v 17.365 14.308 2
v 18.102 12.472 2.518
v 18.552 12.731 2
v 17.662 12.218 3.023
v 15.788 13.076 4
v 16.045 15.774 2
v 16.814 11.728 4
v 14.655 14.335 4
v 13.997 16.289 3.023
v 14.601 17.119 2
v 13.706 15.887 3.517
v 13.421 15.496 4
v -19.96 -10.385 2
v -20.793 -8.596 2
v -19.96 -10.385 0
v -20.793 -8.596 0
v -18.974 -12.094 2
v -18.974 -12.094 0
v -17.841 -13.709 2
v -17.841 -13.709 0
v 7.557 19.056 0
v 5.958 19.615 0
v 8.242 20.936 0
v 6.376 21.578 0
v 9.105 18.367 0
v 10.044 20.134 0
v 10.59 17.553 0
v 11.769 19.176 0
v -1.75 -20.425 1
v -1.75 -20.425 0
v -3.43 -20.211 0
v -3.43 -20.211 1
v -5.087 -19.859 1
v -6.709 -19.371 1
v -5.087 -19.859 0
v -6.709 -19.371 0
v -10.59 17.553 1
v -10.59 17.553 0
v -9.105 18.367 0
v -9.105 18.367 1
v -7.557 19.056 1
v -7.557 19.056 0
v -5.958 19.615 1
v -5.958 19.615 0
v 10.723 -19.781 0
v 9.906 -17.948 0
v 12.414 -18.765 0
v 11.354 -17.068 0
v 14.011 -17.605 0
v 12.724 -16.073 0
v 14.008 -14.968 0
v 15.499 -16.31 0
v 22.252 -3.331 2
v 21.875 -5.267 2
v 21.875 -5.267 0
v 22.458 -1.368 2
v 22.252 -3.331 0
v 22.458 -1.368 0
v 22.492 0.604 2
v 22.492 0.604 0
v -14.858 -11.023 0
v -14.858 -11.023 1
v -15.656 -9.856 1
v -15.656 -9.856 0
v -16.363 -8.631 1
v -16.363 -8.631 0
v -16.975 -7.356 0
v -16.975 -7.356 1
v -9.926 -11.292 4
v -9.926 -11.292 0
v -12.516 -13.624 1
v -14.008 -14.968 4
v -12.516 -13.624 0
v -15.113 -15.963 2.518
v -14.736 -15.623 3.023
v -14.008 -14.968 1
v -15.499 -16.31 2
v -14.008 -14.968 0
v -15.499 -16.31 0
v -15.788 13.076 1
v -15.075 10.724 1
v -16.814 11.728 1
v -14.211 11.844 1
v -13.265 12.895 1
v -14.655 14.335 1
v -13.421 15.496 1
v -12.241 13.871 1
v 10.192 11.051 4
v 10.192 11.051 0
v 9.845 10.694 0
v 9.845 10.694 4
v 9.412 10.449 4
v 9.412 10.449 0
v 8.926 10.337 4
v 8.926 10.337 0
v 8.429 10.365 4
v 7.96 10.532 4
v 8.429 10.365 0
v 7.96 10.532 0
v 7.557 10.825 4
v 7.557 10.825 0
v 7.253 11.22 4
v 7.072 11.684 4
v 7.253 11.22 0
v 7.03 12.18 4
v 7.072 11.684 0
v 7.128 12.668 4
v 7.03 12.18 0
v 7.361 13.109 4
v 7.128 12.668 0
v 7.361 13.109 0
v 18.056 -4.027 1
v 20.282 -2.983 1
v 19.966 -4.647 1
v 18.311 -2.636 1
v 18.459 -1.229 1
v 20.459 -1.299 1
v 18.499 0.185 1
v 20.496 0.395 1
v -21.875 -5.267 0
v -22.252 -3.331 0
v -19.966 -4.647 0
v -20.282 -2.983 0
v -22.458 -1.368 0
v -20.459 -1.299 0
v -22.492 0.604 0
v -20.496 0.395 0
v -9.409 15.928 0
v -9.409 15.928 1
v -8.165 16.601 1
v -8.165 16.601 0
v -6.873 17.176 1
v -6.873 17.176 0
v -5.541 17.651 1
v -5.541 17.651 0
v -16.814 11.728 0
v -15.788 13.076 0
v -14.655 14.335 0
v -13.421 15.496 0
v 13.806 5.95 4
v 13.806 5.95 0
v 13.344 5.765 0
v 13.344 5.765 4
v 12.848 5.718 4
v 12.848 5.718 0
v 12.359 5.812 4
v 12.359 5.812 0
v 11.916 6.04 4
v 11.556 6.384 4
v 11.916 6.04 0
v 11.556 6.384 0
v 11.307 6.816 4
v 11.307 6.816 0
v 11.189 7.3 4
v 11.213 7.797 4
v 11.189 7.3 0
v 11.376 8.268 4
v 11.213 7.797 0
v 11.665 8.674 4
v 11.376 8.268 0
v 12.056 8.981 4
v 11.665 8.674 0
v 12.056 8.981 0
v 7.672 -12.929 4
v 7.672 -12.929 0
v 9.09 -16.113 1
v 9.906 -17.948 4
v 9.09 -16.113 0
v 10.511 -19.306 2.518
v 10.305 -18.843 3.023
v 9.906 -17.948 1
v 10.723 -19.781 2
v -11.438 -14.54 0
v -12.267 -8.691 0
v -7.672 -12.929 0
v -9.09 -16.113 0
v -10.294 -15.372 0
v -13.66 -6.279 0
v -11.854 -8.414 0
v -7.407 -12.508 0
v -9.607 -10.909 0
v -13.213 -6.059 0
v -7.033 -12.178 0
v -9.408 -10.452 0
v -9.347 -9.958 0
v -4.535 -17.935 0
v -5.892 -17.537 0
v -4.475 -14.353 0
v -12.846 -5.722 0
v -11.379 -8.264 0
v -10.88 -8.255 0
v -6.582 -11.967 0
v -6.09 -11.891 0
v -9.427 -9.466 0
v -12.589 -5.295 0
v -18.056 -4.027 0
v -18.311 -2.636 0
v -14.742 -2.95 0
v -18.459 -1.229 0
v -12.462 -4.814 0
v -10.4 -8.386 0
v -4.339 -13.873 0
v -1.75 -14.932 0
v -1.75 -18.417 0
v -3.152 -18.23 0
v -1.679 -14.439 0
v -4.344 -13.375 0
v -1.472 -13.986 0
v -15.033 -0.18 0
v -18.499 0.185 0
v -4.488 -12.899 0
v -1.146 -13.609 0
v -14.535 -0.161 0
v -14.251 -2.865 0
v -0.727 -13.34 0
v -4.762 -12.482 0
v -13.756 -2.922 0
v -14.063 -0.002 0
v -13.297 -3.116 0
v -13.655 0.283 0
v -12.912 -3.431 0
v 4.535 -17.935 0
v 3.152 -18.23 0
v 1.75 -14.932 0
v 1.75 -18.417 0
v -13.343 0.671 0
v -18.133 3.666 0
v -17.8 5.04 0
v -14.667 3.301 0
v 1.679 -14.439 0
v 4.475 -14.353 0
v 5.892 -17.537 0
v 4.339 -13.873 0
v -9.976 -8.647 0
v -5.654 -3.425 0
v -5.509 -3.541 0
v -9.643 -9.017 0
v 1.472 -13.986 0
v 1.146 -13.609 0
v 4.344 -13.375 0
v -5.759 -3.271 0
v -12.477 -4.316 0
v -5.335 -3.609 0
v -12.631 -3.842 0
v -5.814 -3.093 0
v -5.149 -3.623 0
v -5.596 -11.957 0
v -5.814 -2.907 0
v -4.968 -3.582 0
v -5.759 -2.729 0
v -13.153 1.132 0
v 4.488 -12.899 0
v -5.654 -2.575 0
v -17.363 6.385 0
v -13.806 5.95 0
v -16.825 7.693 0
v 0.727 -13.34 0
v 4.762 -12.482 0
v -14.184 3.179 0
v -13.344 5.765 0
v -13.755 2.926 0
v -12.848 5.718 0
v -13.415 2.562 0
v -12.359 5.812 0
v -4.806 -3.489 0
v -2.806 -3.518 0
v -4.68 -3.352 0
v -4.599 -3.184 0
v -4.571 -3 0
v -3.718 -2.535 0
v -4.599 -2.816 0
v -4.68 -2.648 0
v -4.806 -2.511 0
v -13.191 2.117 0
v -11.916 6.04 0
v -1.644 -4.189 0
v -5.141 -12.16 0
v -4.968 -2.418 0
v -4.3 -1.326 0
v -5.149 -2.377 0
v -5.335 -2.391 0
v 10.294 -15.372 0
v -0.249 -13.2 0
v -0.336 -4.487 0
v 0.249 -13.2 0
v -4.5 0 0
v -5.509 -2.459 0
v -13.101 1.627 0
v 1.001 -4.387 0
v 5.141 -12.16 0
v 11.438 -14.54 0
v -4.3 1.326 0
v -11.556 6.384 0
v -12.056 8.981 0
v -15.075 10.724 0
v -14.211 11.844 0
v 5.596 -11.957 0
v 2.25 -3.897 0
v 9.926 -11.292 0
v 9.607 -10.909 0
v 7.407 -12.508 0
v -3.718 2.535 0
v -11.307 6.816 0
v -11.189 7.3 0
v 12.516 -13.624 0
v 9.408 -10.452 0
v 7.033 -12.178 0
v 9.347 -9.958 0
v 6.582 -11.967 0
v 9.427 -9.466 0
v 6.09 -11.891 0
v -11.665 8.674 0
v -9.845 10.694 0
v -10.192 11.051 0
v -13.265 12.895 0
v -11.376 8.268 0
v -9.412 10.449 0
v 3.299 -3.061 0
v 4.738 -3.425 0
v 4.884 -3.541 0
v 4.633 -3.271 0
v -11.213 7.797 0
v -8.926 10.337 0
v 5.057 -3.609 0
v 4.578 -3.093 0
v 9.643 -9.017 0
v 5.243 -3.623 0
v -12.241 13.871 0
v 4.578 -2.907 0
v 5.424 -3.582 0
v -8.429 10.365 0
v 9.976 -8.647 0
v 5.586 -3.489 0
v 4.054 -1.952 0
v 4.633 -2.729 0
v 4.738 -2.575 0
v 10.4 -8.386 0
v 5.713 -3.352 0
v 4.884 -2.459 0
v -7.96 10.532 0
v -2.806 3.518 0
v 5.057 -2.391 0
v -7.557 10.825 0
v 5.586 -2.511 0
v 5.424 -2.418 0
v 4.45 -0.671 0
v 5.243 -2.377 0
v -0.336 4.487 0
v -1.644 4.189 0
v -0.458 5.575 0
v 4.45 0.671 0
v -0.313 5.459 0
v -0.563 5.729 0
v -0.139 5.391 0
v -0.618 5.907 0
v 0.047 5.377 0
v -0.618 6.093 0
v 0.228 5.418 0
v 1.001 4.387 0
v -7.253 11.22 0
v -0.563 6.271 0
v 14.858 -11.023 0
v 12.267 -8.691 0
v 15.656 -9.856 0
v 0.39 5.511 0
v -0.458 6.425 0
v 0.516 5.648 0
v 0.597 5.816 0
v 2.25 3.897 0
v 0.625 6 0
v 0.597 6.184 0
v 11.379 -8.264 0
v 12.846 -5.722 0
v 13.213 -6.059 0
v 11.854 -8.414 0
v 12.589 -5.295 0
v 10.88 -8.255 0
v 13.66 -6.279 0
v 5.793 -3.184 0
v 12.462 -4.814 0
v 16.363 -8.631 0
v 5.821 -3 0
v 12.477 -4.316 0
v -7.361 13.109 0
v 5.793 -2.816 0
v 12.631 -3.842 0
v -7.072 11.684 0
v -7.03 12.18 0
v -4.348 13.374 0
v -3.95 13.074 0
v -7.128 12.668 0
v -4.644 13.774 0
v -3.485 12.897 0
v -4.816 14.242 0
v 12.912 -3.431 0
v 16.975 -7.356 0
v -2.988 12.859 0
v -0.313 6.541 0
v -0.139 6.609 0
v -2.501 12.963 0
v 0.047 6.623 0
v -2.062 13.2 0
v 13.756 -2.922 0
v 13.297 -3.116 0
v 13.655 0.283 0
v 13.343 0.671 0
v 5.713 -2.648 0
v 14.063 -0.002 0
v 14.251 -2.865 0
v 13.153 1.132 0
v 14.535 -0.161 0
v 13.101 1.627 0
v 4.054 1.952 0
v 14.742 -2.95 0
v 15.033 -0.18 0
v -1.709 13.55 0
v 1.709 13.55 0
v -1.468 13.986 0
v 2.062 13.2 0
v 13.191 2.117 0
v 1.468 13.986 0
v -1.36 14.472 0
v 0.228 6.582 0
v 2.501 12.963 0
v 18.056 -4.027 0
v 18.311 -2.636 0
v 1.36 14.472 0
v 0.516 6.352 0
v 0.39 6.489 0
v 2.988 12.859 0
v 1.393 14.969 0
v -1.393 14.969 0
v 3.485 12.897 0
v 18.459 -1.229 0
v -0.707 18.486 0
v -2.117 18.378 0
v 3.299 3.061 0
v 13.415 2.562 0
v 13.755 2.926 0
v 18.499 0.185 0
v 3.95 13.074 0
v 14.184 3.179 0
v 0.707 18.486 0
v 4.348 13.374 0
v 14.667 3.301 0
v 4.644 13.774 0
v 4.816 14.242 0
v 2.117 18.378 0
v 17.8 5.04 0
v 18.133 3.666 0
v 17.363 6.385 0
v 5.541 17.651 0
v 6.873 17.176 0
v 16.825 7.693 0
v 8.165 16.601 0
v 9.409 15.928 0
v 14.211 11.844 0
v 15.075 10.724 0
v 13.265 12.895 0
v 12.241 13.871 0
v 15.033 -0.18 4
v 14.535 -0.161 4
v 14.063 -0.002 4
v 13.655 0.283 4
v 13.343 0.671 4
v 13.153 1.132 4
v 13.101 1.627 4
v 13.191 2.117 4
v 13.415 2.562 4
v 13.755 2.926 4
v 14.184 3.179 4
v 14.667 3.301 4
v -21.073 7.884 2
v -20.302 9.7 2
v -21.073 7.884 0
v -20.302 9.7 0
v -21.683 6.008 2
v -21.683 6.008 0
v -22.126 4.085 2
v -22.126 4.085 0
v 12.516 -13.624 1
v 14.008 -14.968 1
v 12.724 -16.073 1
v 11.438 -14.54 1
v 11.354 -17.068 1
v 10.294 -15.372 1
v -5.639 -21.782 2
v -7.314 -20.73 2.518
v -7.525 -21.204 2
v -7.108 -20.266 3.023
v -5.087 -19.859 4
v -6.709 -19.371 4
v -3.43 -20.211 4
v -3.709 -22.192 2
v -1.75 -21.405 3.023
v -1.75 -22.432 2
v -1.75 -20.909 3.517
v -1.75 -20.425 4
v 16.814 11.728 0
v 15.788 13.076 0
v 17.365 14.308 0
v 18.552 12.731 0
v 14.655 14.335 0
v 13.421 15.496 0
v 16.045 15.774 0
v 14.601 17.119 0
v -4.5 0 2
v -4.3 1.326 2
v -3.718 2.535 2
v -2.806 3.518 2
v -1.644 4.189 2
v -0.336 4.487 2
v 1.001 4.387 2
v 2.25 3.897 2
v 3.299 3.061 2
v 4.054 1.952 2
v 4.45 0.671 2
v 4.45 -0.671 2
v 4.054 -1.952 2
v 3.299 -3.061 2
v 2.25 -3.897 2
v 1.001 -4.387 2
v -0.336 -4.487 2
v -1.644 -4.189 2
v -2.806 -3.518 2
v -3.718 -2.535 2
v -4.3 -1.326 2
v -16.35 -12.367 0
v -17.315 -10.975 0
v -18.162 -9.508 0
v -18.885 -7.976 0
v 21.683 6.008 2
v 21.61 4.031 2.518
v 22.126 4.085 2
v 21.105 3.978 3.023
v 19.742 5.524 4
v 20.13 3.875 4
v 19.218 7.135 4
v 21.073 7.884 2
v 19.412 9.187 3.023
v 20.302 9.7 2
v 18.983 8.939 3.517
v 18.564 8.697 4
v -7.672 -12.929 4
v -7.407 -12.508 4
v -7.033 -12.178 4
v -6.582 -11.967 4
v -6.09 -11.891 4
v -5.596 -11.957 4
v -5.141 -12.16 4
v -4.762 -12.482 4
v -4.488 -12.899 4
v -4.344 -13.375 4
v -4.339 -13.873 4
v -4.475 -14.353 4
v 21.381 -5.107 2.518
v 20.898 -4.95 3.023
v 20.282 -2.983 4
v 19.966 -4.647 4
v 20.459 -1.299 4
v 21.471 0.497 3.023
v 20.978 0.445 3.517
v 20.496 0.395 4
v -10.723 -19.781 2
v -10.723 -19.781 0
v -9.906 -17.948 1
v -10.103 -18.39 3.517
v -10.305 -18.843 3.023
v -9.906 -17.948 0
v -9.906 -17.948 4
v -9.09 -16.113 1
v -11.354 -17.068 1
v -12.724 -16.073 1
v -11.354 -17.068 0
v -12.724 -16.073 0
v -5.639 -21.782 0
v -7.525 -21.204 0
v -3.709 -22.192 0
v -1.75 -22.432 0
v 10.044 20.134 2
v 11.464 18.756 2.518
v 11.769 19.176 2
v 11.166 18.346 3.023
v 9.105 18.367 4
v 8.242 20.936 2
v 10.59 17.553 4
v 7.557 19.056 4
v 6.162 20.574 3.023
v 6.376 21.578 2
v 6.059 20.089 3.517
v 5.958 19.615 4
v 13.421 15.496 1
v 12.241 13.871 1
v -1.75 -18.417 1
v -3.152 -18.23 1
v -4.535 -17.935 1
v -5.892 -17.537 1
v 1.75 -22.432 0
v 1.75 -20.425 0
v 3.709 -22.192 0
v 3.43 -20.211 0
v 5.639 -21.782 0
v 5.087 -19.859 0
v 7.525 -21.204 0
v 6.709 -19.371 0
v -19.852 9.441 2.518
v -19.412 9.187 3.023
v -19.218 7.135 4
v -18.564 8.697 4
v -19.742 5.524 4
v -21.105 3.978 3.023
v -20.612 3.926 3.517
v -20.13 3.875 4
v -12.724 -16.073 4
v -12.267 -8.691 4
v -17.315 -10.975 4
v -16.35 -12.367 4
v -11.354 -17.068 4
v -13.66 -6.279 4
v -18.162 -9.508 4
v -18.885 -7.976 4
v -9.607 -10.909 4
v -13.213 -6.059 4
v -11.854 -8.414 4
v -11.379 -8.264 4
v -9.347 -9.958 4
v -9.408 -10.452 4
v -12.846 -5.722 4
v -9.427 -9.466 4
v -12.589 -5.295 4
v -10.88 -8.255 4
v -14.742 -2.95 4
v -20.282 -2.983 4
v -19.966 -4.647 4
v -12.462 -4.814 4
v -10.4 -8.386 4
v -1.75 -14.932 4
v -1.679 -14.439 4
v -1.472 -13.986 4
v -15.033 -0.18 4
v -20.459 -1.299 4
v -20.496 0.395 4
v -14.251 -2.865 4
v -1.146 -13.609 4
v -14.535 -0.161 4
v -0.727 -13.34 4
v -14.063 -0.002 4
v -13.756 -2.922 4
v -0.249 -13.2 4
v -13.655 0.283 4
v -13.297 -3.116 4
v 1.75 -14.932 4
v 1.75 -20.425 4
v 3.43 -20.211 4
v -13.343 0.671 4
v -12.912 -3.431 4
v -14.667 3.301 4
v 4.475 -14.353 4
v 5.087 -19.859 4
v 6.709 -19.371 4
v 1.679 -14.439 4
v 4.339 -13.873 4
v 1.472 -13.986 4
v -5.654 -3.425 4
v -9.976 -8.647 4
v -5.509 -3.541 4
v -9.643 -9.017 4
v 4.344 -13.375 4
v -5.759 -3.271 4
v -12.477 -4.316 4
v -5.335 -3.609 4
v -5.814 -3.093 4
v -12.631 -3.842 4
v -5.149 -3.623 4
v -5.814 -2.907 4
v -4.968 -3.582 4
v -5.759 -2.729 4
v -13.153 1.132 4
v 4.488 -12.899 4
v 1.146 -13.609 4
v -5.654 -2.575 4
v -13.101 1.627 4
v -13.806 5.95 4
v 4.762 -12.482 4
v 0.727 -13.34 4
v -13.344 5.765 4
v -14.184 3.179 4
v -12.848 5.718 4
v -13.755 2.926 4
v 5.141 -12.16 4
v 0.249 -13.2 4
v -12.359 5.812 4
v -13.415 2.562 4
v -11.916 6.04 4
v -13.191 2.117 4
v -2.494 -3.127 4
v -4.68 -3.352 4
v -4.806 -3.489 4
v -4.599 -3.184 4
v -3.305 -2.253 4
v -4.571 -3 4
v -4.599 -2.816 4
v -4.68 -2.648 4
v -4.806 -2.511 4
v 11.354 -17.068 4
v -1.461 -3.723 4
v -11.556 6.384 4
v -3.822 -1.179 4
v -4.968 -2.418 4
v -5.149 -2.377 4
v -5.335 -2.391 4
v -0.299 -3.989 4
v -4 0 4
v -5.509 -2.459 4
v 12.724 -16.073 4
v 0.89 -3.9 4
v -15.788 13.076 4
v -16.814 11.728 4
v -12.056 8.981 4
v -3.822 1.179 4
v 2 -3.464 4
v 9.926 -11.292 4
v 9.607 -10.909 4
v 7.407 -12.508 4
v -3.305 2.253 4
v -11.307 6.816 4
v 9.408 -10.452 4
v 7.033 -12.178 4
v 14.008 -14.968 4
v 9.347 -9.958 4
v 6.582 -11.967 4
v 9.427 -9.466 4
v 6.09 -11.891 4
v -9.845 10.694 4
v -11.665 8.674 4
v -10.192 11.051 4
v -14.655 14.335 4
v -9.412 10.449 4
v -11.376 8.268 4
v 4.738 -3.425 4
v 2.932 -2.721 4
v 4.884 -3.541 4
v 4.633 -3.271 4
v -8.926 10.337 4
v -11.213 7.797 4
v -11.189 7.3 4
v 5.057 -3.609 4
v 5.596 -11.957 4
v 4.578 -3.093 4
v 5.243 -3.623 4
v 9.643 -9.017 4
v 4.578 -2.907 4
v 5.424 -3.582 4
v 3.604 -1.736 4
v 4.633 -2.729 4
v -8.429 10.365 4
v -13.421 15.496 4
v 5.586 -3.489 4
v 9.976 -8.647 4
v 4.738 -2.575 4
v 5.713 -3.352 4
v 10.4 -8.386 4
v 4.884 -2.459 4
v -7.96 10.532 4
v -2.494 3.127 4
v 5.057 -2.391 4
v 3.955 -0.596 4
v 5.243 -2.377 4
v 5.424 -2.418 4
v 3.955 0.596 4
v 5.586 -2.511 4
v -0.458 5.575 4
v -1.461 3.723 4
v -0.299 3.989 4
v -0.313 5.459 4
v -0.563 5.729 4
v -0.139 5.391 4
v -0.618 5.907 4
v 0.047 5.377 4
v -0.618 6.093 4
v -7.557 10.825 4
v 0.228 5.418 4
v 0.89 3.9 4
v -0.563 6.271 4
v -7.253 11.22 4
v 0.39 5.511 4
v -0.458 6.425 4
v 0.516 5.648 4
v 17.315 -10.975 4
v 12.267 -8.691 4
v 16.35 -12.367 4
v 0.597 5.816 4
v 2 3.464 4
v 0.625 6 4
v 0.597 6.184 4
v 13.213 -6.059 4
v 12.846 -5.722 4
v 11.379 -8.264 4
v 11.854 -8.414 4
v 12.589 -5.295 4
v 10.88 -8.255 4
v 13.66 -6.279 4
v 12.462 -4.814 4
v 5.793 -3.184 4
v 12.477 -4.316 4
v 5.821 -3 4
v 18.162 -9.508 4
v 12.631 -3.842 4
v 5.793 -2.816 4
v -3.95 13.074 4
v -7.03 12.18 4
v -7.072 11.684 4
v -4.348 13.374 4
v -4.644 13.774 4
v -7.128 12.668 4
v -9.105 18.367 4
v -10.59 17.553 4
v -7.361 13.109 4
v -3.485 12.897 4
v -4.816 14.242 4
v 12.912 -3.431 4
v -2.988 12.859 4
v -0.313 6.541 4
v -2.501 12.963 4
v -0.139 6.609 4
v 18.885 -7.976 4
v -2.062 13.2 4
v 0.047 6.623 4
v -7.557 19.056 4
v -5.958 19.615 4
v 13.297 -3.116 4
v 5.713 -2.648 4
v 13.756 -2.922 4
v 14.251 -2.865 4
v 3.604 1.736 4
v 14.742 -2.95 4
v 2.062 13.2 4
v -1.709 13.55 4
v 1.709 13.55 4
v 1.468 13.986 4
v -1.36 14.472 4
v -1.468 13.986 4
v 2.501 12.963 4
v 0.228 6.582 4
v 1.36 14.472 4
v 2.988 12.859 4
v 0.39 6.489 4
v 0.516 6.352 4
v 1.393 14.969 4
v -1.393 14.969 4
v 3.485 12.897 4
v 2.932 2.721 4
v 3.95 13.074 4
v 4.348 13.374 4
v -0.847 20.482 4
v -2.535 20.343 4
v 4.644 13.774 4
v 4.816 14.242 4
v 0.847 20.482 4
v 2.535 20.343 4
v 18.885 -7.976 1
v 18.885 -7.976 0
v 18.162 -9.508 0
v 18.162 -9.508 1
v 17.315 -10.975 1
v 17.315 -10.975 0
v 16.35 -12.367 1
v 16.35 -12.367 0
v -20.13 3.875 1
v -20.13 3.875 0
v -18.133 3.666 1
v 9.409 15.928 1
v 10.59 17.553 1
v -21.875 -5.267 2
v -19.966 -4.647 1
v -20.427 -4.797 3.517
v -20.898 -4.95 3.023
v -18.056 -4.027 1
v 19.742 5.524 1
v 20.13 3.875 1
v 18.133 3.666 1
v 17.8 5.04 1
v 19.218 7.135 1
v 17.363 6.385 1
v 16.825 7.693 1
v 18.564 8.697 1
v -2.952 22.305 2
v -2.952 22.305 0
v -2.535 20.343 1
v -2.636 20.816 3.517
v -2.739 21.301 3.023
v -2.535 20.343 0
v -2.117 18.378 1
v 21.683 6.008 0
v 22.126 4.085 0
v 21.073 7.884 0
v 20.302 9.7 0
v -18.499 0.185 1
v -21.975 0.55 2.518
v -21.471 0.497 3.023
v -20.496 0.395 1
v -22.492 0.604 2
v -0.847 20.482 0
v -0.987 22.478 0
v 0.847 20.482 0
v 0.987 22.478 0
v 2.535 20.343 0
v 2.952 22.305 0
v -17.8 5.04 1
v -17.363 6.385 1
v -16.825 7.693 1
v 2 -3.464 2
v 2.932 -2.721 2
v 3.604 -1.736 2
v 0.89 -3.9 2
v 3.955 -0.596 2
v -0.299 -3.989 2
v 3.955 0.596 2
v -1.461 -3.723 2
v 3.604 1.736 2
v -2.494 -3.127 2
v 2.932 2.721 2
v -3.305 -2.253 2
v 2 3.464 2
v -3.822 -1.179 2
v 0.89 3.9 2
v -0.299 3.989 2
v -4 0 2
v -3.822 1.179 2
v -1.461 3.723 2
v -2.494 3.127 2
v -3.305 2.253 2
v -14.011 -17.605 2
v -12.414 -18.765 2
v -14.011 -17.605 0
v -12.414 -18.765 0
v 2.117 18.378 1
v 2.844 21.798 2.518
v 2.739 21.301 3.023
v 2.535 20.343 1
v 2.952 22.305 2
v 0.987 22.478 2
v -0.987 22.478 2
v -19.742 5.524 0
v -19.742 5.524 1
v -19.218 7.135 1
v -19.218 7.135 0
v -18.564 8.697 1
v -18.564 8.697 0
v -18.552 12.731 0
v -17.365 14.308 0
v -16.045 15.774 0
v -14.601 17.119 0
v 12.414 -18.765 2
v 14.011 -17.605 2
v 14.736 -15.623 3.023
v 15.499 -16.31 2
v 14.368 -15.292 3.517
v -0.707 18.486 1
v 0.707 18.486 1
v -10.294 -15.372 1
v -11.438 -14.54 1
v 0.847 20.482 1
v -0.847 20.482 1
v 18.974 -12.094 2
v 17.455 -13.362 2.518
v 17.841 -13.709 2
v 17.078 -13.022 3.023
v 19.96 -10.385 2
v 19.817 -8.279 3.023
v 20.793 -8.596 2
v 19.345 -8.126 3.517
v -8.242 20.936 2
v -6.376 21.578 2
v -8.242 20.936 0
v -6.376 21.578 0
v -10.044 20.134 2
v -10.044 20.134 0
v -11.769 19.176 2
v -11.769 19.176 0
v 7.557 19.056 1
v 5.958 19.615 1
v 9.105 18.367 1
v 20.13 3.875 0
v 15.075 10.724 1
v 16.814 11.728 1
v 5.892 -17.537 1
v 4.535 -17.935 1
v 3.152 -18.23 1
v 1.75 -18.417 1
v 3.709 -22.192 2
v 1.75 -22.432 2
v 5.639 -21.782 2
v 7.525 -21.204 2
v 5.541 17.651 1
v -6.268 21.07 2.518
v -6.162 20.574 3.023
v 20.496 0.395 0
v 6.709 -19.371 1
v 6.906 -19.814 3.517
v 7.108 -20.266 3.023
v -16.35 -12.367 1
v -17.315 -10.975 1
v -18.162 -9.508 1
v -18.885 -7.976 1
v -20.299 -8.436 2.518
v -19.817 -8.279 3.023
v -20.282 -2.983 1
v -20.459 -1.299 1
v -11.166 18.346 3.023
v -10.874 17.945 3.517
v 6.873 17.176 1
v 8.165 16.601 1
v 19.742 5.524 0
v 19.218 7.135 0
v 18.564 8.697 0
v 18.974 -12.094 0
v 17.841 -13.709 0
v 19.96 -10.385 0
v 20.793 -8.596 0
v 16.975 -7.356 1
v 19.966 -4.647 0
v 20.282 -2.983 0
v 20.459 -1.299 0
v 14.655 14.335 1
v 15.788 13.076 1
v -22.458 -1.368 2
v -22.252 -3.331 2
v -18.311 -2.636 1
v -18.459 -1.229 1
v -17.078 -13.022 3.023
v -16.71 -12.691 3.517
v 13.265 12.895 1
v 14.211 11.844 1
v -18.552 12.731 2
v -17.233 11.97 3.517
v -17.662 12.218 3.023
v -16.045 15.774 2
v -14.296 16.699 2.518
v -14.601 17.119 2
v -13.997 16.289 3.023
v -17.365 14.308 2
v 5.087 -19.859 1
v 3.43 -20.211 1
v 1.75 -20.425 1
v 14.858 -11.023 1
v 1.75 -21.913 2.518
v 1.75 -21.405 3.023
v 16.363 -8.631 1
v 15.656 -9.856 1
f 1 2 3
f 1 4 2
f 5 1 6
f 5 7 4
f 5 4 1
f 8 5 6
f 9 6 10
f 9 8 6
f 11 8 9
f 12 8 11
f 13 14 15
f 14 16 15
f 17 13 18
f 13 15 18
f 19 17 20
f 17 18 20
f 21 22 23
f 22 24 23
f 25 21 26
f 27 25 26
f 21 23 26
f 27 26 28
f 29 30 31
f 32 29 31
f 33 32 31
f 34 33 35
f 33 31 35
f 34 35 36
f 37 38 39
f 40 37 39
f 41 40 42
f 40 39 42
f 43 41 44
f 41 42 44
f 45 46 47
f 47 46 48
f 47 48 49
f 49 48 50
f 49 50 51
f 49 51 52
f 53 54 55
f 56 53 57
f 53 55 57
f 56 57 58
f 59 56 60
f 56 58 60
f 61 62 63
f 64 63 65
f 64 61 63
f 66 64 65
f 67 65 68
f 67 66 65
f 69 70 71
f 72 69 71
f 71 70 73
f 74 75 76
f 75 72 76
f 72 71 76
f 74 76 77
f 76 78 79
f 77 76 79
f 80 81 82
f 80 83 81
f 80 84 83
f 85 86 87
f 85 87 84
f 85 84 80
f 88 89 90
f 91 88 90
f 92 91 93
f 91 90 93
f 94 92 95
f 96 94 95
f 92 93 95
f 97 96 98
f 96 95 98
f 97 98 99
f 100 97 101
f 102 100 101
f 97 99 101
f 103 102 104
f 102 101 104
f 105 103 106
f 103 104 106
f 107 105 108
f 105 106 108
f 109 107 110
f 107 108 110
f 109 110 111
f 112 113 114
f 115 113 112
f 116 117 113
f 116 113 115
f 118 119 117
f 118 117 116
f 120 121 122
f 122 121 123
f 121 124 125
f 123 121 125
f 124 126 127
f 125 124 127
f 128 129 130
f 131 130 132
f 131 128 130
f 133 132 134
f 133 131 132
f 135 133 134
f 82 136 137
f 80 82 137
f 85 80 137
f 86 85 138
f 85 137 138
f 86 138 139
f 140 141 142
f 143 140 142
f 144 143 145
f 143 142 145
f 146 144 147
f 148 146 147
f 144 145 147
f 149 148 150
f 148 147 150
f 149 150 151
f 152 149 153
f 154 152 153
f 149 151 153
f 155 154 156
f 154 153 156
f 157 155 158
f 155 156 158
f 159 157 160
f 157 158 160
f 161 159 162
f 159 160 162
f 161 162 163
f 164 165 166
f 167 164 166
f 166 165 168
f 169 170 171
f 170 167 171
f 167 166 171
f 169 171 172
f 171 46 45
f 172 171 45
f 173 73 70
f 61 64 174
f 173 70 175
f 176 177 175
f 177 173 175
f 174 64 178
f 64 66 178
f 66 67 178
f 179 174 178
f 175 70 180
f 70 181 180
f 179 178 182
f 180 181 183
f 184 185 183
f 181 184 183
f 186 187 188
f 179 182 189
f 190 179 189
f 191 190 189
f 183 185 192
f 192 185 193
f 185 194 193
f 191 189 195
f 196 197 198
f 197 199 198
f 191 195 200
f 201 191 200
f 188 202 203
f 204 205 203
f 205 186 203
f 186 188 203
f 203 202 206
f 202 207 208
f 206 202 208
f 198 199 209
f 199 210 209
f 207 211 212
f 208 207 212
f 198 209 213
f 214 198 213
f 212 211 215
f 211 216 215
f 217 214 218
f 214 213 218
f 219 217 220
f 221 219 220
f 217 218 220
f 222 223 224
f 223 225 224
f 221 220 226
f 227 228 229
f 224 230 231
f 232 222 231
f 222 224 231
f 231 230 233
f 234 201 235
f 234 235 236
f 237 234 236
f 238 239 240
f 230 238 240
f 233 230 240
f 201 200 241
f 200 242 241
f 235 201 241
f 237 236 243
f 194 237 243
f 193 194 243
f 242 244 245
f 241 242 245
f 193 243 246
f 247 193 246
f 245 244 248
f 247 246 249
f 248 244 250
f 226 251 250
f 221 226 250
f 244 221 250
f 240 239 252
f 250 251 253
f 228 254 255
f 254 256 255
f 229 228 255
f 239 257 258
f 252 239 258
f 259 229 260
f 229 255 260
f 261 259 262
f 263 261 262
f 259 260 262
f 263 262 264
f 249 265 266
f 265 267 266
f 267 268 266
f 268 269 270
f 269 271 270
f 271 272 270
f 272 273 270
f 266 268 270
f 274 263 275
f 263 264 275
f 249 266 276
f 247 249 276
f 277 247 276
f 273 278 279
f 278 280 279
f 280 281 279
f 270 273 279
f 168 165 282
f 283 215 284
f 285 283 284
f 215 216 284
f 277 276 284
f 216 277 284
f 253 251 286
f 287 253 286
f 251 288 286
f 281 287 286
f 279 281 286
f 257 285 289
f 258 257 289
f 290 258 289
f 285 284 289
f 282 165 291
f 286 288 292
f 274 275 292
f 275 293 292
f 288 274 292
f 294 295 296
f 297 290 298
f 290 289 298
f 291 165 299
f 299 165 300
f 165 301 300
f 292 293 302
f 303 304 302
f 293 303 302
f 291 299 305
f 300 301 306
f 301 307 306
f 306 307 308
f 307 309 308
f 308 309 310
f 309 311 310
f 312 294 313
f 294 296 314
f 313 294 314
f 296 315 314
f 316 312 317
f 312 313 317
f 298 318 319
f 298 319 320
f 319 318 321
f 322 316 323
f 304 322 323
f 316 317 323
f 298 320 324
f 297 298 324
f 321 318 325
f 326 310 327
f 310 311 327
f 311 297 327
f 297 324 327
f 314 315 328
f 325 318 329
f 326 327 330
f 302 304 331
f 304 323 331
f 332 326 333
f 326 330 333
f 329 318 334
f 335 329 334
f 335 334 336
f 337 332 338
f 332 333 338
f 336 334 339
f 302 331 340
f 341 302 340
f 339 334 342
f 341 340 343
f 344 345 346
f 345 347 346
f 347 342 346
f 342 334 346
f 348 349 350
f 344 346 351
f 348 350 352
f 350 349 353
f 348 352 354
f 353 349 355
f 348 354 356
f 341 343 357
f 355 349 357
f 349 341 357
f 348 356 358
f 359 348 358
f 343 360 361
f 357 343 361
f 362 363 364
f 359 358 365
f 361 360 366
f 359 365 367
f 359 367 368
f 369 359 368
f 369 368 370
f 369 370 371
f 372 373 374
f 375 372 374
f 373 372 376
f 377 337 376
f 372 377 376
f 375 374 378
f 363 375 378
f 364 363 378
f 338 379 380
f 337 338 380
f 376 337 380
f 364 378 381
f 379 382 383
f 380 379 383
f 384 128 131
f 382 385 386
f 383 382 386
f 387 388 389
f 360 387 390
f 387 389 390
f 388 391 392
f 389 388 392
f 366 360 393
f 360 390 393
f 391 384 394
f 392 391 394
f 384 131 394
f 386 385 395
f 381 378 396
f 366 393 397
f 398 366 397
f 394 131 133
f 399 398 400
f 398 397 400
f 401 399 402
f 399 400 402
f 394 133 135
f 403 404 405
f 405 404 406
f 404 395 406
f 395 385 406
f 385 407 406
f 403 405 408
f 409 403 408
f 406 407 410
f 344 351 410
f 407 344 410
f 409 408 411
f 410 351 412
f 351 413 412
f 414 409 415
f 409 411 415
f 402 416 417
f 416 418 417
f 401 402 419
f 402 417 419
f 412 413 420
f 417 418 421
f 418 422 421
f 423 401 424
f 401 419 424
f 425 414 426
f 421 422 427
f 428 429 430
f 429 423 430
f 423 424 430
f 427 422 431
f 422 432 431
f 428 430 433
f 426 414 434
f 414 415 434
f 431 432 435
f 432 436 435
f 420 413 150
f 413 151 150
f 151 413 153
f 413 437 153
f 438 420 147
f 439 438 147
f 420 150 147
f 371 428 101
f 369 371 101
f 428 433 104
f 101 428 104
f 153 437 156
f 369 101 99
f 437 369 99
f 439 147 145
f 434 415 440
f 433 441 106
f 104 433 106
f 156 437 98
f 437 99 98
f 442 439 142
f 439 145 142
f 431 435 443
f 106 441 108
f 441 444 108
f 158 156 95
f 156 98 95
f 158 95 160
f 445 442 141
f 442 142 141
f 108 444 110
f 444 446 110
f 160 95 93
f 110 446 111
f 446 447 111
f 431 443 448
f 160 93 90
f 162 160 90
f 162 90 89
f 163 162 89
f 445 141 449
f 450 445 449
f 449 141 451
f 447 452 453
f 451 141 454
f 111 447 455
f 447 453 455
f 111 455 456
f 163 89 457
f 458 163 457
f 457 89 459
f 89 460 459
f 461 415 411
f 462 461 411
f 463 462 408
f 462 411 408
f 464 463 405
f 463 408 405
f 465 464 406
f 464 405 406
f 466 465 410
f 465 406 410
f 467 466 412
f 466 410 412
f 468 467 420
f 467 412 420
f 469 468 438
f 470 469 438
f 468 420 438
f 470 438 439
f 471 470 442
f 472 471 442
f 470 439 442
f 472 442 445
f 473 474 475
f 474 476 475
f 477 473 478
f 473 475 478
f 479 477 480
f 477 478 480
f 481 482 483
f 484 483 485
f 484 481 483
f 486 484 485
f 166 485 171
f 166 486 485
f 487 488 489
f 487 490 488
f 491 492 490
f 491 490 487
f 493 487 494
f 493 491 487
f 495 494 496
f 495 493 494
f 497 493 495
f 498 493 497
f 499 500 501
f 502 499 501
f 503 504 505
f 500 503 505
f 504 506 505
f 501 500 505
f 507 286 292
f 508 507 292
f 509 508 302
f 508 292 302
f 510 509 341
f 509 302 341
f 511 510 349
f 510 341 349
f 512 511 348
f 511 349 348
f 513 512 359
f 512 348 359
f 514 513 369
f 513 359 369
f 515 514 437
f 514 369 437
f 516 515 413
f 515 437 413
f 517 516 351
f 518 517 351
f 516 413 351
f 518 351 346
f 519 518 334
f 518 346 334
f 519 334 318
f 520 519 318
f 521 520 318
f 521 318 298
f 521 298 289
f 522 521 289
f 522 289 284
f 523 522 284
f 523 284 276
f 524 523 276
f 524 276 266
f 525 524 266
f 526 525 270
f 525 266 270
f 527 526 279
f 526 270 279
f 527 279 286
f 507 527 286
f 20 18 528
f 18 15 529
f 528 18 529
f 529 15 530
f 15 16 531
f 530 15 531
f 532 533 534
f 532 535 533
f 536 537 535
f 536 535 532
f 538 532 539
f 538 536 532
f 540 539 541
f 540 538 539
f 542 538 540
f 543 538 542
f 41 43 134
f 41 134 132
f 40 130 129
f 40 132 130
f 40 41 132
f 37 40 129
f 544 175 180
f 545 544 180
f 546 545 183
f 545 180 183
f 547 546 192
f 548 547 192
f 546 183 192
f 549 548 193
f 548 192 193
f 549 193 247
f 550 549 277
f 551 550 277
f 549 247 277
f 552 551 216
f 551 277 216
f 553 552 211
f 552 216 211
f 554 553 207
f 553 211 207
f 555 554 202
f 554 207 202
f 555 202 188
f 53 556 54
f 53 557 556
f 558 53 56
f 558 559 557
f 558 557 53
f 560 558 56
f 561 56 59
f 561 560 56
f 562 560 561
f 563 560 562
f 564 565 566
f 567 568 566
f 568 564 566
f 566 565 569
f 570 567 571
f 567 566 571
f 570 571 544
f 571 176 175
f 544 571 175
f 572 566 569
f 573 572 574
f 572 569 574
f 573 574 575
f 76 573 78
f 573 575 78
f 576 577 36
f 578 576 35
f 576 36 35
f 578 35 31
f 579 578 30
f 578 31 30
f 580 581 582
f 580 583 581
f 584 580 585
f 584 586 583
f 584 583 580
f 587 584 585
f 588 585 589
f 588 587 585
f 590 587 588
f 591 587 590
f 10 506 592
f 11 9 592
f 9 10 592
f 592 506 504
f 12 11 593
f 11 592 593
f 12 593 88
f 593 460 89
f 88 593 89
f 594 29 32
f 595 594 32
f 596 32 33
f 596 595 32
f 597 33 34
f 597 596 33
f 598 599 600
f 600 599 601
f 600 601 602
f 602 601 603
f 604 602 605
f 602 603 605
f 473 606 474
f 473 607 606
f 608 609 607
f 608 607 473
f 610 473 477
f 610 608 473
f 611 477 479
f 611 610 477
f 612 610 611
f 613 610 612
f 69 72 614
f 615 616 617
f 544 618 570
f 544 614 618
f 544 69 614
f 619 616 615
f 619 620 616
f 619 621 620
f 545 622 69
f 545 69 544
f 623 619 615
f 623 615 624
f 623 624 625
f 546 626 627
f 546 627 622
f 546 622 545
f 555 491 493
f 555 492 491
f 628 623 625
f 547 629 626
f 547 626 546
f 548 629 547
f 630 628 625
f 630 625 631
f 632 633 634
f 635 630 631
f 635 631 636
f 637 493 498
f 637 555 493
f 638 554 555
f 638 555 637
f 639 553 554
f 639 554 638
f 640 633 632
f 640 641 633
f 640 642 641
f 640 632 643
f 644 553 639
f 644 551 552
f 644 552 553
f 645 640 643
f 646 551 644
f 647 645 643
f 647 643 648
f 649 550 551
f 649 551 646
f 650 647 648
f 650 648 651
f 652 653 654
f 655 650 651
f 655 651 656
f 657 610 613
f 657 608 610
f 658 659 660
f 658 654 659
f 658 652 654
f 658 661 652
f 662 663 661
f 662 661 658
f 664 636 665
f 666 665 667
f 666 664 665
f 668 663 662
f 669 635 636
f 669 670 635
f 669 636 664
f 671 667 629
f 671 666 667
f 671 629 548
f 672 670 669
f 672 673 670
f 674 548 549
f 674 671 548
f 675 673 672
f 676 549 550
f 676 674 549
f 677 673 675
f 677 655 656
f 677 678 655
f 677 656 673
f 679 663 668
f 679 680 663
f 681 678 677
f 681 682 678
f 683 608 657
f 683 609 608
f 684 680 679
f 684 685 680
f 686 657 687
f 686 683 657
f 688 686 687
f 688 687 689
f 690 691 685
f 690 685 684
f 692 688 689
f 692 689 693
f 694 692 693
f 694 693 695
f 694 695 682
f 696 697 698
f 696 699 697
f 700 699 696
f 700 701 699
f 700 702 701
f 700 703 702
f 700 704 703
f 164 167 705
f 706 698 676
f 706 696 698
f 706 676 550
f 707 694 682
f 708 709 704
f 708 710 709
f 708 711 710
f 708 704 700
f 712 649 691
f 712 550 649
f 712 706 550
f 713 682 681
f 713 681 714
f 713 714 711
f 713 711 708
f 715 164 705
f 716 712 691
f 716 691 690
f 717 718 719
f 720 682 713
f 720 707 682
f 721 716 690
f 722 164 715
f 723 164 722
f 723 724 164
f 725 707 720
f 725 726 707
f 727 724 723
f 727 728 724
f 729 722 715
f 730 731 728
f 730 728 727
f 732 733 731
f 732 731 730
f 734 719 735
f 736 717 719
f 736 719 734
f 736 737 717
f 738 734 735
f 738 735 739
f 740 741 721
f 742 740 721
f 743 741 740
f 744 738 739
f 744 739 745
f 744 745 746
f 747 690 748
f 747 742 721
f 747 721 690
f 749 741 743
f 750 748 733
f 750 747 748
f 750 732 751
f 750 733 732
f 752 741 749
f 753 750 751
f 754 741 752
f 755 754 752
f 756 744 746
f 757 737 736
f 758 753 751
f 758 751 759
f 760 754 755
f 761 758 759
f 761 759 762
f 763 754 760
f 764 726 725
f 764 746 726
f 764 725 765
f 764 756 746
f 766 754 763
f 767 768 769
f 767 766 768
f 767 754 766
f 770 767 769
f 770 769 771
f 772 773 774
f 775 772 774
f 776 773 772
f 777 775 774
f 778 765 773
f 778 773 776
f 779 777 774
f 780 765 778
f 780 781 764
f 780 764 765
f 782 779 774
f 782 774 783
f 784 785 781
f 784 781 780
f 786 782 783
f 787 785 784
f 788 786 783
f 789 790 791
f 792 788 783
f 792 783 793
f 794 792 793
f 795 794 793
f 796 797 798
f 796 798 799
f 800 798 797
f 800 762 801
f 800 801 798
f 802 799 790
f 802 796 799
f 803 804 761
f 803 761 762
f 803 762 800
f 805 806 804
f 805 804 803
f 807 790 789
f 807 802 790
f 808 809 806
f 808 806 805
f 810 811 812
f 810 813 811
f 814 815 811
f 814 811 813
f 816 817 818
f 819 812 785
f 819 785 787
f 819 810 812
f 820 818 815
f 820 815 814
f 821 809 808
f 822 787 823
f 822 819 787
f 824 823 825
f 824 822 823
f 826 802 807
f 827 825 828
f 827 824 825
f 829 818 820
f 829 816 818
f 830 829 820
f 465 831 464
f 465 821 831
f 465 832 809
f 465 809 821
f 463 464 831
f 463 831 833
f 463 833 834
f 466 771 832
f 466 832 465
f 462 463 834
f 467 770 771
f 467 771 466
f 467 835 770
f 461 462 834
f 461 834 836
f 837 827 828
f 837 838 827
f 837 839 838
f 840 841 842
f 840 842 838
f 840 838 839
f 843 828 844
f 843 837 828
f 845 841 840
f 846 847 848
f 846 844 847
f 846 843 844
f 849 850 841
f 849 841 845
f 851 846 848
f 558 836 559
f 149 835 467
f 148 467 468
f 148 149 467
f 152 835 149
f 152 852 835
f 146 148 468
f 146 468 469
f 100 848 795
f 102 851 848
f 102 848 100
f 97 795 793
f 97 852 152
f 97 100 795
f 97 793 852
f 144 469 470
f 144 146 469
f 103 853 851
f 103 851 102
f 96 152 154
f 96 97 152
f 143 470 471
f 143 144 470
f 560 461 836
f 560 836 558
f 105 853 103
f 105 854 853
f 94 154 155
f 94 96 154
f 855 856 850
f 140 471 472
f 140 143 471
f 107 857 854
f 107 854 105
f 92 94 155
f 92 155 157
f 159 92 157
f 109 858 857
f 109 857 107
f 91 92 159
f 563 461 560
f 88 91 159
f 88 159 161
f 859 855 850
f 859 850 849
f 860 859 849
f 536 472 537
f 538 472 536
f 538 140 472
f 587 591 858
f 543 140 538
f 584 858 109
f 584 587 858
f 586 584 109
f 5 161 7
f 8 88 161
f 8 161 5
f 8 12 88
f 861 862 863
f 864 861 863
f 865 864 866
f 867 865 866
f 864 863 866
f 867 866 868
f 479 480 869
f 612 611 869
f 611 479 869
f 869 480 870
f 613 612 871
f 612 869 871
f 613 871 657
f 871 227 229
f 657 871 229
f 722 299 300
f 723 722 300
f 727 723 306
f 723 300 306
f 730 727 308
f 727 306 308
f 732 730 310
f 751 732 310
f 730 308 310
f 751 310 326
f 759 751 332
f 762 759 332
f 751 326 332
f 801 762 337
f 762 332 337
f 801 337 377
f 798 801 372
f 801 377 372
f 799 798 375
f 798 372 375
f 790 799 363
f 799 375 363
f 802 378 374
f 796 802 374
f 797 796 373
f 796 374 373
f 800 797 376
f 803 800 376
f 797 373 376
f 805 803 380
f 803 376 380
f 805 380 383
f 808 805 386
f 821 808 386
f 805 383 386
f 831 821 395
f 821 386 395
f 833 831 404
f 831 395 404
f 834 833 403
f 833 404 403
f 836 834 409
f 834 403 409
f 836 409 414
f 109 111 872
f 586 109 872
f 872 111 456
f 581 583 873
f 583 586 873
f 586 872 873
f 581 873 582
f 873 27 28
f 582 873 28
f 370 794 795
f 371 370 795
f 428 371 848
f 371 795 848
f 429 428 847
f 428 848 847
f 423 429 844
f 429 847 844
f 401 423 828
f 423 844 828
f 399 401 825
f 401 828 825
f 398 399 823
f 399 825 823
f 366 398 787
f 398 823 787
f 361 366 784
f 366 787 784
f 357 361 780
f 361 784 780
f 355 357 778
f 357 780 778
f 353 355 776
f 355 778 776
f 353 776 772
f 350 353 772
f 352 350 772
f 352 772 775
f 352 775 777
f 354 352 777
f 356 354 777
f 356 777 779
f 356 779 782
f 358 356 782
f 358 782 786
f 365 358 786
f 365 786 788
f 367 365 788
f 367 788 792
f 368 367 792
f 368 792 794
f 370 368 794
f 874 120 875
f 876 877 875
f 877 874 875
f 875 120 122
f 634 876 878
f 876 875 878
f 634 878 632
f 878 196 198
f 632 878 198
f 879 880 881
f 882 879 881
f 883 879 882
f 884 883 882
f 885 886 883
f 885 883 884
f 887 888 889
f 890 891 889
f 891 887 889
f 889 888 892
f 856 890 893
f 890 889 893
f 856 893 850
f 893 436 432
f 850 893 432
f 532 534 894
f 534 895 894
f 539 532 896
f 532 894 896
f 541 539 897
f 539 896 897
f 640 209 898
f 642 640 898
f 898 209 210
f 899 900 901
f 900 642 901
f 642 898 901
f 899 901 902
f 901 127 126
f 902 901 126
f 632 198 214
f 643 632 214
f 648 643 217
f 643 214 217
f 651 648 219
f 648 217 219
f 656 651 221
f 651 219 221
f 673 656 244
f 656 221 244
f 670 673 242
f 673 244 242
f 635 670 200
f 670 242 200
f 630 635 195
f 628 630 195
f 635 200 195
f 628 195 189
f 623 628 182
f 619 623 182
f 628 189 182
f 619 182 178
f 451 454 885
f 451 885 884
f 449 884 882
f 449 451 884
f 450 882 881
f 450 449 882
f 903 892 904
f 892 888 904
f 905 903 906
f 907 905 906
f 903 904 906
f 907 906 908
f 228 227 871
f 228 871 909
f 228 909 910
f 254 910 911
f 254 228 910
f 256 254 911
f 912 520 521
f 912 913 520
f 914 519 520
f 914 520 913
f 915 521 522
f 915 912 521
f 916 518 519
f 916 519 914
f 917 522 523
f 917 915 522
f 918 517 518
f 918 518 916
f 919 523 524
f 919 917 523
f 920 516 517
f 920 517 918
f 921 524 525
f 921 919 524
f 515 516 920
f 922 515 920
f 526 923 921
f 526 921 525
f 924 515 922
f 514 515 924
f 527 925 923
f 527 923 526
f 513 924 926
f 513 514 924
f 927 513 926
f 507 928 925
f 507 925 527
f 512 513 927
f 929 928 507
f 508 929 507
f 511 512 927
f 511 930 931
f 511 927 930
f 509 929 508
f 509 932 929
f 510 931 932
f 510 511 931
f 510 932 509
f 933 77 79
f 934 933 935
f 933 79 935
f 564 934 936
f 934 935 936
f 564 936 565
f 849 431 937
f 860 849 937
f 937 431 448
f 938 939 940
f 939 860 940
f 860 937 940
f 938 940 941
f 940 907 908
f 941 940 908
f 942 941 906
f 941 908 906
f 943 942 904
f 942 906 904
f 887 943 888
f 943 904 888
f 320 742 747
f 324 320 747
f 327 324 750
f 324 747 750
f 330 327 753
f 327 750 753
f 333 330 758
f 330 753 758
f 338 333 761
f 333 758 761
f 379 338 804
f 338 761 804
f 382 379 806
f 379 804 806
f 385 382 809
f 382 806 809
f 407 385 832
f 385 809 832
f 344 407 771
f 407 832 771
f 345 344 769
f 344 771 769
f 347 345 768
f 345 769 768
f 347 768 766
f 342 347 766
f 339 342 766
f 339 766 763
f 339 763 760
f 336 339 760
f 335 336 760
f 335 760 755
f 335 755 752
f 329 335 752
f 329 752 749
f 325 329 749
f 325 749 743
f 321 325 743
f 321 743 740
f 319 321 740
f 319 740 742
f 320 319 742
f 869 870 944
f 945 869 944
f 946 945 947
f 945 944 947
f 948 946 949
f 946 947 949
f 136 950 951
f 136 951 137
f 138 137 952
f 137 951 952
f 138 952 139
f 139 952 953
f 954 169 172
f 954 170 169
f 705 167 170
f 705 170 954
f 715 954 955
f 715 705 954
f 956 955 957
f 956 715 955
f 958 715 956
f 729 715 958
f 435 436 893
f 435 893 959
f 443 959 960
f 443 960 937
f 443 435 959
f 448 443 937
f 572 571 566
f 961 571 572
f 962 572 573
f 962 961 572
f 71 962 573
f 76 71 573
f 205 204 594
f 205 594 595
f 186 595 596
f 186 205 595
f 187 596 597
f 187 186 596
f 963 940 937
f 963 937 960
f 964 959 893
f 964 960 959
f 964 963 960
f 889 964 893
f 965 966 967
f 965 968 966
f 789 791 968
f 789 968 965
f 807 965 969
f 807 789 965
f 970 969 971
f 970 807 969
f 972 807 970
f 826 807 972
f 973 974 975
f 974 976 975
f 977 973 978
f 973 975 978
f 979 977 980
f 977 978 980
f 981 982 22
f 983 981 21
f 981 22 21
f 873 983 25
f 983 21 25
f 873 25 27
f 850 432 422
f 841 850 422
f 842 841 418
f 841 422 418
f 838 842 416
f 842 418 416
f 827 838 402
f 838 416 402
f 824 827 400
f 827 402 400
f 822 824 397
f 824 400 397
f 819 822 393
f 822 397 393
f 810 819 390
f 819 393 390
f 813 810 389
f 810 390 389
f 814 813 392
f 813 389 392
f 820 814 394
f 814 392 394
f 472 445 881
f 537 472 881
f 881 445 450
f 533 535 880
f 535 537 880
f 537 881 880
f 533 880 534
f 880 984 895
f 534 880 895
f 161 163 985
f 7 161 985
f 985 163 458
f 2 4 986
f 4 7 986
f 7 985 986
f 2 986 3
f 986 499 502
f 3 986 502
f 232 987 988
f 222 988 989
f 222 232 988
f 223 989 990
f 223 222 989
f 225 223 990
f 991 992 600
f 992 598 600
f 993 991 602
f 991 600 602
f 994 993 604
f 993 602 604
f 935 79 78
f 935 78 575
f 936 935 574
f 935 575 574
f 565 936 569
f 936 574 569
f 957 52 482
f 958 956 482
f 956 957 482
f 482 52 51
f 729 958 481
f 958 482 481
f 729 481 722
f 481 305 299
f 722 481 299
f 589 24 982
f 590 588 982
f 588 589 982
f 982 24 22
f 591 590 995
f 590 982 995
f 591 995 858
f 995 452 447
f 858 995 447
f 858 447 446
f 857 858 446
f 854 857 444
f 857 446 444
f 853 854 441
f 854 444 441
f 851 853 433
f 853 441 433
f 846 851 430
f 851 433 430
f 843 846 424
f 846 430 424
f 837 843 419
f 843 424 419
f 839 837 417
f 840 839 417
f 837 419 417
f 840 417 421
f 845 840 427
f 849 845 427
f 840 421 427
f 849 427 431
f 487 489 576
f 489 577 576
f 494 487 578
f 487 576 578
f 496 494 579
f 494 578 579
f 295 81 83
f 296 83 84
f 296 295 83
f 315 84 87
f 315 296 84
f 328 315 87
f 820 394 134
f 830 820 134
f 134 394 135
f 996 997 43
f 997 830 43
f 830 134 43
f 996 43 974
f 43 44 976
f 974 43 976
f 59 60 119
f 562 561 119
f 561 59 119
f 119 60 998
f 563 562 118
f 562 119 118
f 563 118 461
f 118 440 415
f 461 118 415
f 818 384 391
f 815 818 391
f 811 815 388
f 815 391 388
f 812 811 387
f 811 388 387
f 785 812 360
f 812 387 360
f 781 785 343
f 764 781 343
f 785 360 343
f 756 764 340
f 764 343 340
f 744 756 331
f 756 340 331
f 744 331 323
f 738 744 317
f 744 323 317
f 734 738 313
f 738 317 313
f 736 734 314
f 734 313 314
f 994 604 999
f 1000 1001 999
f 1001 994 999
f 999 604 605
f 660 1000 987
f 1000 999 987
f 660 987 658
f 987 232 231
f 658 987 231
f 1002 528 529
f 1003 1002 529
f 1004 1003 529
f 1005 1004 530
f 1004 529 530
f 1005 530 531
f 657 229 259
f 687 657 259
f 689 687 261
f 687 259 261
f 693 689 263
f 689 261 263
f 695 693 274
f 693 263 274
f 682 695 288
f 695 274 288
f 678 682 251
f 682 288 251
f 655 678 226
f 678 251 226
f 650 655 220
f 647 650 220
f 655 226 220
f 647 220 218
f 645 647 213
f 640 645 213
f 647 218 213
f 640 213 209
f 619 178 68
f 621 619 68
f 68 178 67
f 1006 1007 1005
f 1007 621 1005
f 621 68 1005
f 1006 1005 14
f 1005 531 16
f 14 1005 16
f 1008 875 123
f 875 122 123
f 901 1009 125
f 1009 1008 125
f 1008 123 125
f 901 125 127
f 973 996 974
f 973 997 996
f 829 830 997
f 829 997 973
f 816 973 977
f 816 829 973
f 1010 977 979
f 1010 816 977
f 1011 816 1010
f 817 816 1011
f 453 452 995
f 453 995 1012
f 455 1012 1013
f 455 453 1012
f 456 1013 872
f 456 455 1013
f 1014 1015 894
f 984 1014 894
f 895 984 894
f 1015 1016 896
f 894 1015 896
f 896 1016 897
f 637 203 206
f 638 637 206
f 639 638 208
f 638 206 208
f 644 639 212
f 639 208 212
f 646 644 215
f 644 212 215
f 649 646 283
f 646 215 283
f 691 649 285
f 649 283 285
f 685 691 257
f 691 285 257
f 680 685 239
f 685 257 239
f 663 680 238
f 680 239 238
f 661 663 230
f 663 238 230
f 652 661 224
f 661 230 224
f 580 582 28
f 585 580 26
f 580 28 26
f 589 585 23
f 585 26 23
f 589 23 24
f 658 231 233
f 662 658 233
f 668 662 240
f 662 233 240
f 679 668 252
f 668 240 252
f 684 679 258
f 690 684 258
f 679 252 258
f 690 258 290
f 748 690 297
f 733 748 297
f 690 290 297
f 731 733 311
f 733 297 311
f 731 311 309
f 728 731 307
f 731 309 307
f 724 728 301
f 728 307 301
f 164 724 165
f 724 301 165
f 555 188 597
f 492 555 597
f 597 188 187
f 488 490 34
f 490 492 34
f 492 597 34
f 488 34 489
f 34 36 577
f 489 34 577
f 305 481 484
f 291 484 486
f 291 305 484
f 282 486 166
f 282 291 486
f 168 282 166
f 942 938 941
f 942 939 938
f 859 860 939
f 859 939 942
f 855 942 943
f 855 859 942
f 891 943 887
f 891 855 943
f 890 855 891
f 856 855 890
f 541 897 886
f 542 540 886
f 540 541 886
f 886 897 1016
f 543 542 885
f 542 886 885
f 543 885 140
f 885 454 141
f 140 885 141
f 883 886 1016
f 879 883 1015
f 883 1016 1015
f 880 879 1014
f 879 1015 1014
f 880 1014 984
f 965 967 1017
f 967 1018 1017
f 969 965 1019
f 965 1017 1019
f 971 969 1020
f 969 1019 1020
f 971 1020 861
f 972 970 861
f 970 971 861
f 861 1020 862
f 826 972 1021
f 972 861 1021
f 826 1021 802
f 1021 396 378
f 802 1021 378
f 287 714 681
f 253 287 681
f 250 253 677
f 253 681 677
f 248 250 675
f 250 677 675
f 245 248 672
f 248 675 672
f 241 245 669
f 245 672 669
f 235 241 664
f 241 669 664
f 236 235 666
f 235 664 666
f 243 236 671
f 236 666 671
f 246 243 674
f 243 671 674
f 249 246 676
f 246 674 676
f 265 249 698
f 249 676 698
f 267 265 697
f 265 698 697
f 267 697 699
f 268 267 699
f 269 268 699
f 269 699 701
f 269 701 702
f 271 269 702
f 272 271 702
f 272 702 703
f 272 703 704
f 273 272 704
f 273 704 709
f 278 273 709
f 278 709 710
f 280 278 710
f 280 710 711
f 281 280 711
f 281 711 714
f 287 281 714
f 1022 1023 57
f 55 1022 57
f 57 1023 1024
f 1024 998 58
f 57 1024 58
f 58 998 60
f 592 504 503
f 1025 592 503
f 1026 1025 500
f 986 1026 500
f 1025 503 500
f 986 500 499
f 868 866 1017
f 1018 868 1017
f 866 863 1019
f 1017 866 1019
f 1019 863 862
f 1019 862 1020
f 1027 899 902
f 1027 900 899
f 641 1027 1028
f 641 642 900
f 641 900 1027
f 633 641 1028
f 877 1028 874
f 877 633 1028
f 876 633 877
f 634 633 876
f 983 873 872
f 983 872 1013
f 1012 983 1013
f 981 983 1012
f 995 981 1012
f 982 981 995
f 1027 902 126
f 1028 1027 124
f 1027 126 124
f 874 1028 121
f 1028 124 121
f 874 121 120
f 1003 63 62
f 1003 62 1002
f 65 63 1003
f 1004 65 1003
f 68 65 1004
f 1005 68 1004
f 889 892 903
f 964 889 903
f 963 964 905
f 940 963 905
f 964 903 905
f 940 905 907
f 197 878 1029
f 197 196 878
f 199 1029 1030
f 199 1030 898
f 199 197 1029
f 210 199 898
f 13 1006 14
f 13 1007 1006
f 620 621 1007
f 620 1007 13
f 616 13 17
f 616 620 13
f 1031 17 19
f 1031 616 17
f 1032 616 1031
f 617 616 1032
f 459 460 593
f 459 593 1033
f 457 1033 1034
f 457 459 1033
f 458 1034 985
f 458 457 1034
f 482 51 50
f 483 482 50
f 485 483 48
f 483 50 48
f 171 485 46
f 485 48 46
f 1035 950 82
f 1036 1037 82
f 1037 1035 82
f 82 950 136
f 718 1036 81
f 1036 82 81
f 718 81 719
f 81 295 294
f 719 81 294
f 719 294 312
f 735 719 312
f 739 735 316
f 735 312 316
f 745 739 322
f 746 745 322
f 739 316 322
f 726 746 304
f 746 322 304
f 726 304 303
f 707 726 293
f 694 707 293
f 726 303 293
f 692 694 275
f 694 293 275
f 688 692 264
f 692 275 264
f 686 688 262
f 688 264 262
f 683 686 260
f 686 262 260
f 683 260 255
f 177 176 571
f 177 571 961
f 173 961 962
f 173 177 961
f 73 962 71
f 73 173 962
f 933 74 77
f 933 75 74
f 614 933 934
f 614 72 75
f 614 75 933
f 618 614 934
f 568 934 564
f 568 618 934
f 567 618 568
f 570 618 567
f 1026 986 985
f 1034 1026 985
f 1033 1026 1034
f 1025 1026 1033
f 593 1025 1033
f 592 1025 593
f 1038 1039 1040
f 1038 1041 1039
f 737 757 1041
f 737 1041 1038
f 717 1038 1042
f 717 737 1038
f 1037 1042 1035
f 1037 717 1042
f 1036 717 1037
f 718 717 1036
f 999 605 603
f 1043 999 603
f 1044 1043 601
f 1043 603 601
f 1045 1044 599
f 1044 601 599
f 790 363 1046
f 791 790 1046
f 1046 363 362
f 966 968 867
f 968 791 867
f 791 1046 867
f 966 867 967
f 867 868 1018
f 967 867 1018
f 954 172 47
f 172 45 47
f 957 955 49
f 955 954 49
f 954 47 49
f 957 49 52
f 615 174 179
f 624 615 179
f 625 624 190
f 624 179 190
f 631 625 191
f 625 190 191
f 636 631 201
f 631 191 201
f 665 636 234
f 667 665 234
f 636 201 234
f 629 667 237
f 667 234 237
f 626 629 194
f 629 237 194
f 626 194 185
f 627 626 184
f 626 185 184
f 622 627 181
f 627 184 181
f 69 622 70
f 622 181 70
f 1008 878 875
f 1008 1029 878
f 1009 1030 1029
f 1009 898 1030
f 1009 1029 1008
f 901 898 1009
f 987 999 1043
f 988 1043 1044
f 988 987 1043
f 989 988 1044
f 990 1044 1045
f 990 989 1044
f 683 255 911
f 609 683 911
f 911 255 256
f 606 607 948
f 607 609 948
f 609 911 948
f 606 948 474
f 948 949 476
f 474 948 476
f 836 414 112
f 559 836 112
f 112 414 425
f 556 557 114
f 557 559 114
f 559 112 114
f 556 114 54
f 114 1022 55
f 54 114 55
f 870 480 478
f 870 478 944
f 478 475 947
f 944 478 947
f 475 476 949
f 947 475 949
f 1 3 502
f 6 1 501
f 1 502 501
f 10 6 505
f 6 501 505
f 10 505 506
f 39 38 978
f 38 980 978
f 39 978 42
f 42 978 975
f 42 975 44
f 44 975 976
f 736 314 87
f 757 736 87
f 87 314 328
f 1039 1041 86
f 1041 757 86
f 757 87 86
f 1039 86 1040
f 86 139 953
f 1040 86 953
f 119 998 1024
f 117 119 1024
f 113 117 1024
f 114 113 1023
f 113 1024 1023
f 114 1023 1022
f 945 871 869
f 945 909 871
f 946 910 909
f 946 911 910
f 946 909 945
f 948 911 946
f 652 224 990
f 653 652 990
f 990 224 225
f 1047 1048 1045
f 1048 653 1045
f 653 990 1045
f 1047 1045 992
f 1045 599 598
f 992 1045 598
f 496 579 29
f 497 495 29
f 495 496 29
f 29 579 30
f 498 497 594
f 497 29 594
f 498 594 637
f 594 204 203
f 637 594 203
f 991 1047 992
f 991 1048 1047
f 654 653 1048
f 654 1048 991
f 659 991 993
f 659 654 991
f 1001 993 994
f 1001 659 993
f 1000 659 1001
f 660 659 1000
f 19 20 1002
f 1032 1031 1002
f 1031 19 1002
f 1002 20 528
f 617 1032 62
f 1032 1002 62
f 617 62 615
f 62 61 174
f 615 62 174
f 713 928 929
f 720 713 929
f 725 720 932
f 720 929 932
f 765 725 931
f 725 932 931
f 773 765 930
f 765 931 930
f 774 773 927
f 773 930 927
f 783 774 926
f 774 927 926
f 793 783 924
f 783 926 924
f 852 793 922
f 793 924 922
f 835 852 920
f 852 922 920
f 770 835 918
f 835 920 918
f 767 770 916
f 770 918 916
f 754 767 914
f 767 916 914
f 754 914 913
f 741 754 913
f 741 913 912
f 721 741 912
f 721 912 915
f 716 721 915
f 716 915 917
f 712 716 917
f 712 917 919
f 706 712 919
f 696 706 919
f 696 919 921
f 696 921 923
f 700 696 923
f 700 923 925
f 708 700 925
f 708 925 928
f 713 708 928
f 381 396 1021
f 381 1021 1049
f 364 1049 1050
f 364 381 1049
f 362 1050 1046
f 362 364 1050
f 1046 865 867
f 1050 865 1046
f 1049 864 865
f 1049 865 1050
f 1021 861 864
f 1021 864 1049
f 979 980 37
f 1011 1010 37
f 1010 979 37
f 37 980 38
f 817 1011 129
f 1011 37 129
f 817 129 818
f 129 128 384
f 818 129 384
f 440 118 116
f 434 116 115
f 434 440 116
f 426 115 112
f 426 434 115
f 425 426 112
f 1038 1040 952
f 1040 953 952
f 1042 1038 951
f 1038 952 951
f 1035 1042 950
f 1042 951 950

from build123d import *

# Parameters (mm, degrees)
ESBO_O1_R                = 22.5
RESSALTO_EXTRUS_O1_DEPTH = 4
CHANFRO1_SIZE            = 2
CORTE_EXTRUS_O1_DEPTH    = 33.070235422
ESBO_O3_R                = 4
CORTE_EXTRUS_O2_DEPTH    = 33.070235422
ESBO_O4_R                = 4.5
CORTE_EXTRUS_O3_DEPTH    = 2
PADR_OCIRCULAR1_COUNT    = 15
ESBO_O5_R                = 20.5
ESBO_O5_R_2              = 18.5
CORTE_EXTRUS_O4_DEPTH    = 1
FURO_ROSCADO_DE_M1_61_D  = 1.25
PADR_OCIRCULAR2_COUNT    = 3


with BuildPart() as part:
    # Esboço1 → Ressalto-extrusão1 (new body)
    with BuildSketch(Plane.XY):
        Circle(ESBO_O1_R)
    extrude(amount=RESSALTO_EXTRUS_O1_DEPTH)

    # Chanfro1
    chanfro1_edges = [part.edges().sort_by_distance(p)[0] for p in [
        (-22.5, 0, 4),
    ]]
    chamfer(chanfro1_edges, length=CHANFRO1_SIZE)

    # Esboço2 → Corte-extrusão1 (cut, through all)
    with BuildSketch(Plane(origin=(0, 0, 0), x_dir=(-1, 0, 0), z_dir=(0, 0, -1))):
        with BuildLine():
            Line((1.75, -22.431841208), (1.75, -14.931841208))
            ThreePointArc((1.75, -14.931841208), (0, -13.181841208), (-1.75, -14.931841208))
            Line((-1.75, -14.931841208), (-1.75, -22.431841208))
            ThreePointArc((-1.75, -22.431841208), (0, -22.5), (1.75, -22.431841208))
        make_face()
    corte_extrus_o1 = extrude(amount=-CORTE_EXTRUS_O1_DEPTH, mode=Mode.SUBTRACT)

    # Esboço3 → Corte-extrusão2 (cut, through all)
    with BuildSketch(Plane(origin=(0, 0, 0), x_dir=(-1, 0, 0), z_dir=(0, 0, -1))):
        Circle(ESBO_O3_R)
    extrude(amount=-CORTE_EXTRUS_O2_DEPTH, mode=Mode.SUBTRACT)

    # Esboço4 → Corte-extrusão3 (cut)
    with BuildSketch(Plane(origin=(0, 0, 0), x_dir=(-1, 0, 0), z_dir=(0, 0, -1))):
        Circle(ESBO_O4_R)
    extrude(amount=-CORTE_EXTRUS_O3_DEPTH, mode=Mode.SUBTRACT)

    # PadrãoCircular1: Corte-extrusão1 ×15 about axis
    padr_ocircular1_axis = Axis((0, 0, 0), (0, 0, 1))
    for i in range(1, PADR_OCIRCULAR1_COUNT):
        add(corte_extrus_o1.rotate(padr_ocircular1_axis, i * 360 / PADR_OCIRCULAR1_COUNT), mode=Mode.SUBTRACT)

    # Esboço5 → Corte-extrusão4 (cut)
    with BuildSketch(Plane(origin=(0, 0, 0), x_dir=(-1, 0, 0), z_dir=(0, 0, -1))):
        Circle(ESBO_O5_R)
        Circle(ESBO_O5_R_2, mode=Mode.SUBTRACT)
    extrude(amount=-CORTE_EXTRUS_O4_DEPTH, mode=Mode.SUBTRACT)

    # Furo roscado de M1.61 (through all)
    with Locations(Plane(origin=(0, 6, 0), x_dir=(-1, 0, 0), z_dir=(0, 0, -1))):
        with Locations((0, 0)):
            furo_roscado_de_m1_61 = Hole(FURO_ROSCADO_DE_M1_61_D / 2)

    # PadrãoCircular2: Furo roscado de M1.61 ×3 about axis
    padr_ocircular2_axis = Axis((0, 0, 0), (0, 0, 1))
    for i in range(1, PADR_OCIRCULAR2_COUNT):
        add(furo_roscado_de_m1_61.rotate(padr_ocircular2_axis, i * 360 / PADR_OCIRCULAR2_COUNT), mode=Mode.SUBTRACT)


solid = part.part
